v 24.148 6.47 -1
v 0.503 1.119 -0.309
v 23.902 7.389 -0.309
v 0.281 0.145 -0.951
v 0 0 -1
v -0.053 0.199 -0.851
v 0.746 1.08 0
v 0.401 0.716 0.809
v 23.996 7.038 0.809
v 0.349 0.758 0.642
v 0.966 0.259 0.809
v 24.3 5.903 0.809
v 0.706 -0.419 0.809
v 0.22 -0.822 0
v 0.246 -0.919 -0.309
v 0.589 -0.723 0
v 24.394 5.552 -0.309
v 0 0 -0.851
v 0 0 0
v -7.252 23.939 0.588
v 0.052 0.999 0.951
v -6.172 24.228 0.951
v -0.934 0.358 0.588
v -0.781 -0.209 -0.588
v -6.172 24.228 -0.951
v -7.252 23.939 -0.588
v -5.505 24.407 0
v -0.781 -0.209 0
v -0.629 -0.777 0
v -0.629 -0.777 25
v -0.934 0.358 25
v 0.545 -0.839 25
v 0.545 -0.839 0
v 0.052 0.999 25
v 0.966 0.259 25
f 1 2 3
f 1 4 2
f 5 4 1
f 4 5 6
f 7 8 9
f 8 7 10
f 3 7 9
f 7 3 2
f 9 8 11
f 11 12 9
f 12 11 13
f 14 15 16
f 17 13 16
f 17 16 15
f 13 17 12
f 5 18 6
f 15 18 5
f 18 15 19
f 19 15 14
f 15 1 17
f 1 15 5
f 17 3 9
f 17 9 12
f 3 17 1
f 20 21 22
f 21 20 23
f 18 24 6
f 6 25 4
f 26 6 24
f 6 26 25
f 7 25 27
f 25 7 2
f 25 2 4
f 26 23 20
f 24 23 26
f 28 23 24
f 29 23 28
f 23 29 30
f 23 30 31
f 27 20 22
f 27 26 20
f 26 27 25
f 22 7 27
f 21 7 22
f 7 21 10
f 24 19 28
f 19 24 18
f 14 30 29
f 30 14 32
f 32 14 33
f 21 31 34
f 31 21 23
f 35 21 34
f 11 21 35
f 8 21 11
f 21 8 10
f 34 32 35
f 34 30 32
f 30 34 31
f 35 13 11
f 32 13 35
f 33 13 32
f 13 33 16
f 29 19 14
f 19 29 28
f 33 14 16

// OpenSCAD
A = [[1,0],[-4,4],[0,2]];

b = [1,2];

echo(A[1][1]);
echo(b);
echo(A*b);

angle = 15;

X = [[cos(angle),-sin(angle),0,0],[sin(angle),cos(angle),0,0],[0,0,1,0],[0,0,0,1]];

module axes(sz=50)
{
    color("red")
      rotate([0,90,0])
      cylinder(d=2,h=sz);


    color("green")
      rotate([-90,0,0])
      cylinder(d=2,h=sz);

    color("blue")
      cylinder(d=2,h=sz);
}

multmatrix(X) axes(25);
